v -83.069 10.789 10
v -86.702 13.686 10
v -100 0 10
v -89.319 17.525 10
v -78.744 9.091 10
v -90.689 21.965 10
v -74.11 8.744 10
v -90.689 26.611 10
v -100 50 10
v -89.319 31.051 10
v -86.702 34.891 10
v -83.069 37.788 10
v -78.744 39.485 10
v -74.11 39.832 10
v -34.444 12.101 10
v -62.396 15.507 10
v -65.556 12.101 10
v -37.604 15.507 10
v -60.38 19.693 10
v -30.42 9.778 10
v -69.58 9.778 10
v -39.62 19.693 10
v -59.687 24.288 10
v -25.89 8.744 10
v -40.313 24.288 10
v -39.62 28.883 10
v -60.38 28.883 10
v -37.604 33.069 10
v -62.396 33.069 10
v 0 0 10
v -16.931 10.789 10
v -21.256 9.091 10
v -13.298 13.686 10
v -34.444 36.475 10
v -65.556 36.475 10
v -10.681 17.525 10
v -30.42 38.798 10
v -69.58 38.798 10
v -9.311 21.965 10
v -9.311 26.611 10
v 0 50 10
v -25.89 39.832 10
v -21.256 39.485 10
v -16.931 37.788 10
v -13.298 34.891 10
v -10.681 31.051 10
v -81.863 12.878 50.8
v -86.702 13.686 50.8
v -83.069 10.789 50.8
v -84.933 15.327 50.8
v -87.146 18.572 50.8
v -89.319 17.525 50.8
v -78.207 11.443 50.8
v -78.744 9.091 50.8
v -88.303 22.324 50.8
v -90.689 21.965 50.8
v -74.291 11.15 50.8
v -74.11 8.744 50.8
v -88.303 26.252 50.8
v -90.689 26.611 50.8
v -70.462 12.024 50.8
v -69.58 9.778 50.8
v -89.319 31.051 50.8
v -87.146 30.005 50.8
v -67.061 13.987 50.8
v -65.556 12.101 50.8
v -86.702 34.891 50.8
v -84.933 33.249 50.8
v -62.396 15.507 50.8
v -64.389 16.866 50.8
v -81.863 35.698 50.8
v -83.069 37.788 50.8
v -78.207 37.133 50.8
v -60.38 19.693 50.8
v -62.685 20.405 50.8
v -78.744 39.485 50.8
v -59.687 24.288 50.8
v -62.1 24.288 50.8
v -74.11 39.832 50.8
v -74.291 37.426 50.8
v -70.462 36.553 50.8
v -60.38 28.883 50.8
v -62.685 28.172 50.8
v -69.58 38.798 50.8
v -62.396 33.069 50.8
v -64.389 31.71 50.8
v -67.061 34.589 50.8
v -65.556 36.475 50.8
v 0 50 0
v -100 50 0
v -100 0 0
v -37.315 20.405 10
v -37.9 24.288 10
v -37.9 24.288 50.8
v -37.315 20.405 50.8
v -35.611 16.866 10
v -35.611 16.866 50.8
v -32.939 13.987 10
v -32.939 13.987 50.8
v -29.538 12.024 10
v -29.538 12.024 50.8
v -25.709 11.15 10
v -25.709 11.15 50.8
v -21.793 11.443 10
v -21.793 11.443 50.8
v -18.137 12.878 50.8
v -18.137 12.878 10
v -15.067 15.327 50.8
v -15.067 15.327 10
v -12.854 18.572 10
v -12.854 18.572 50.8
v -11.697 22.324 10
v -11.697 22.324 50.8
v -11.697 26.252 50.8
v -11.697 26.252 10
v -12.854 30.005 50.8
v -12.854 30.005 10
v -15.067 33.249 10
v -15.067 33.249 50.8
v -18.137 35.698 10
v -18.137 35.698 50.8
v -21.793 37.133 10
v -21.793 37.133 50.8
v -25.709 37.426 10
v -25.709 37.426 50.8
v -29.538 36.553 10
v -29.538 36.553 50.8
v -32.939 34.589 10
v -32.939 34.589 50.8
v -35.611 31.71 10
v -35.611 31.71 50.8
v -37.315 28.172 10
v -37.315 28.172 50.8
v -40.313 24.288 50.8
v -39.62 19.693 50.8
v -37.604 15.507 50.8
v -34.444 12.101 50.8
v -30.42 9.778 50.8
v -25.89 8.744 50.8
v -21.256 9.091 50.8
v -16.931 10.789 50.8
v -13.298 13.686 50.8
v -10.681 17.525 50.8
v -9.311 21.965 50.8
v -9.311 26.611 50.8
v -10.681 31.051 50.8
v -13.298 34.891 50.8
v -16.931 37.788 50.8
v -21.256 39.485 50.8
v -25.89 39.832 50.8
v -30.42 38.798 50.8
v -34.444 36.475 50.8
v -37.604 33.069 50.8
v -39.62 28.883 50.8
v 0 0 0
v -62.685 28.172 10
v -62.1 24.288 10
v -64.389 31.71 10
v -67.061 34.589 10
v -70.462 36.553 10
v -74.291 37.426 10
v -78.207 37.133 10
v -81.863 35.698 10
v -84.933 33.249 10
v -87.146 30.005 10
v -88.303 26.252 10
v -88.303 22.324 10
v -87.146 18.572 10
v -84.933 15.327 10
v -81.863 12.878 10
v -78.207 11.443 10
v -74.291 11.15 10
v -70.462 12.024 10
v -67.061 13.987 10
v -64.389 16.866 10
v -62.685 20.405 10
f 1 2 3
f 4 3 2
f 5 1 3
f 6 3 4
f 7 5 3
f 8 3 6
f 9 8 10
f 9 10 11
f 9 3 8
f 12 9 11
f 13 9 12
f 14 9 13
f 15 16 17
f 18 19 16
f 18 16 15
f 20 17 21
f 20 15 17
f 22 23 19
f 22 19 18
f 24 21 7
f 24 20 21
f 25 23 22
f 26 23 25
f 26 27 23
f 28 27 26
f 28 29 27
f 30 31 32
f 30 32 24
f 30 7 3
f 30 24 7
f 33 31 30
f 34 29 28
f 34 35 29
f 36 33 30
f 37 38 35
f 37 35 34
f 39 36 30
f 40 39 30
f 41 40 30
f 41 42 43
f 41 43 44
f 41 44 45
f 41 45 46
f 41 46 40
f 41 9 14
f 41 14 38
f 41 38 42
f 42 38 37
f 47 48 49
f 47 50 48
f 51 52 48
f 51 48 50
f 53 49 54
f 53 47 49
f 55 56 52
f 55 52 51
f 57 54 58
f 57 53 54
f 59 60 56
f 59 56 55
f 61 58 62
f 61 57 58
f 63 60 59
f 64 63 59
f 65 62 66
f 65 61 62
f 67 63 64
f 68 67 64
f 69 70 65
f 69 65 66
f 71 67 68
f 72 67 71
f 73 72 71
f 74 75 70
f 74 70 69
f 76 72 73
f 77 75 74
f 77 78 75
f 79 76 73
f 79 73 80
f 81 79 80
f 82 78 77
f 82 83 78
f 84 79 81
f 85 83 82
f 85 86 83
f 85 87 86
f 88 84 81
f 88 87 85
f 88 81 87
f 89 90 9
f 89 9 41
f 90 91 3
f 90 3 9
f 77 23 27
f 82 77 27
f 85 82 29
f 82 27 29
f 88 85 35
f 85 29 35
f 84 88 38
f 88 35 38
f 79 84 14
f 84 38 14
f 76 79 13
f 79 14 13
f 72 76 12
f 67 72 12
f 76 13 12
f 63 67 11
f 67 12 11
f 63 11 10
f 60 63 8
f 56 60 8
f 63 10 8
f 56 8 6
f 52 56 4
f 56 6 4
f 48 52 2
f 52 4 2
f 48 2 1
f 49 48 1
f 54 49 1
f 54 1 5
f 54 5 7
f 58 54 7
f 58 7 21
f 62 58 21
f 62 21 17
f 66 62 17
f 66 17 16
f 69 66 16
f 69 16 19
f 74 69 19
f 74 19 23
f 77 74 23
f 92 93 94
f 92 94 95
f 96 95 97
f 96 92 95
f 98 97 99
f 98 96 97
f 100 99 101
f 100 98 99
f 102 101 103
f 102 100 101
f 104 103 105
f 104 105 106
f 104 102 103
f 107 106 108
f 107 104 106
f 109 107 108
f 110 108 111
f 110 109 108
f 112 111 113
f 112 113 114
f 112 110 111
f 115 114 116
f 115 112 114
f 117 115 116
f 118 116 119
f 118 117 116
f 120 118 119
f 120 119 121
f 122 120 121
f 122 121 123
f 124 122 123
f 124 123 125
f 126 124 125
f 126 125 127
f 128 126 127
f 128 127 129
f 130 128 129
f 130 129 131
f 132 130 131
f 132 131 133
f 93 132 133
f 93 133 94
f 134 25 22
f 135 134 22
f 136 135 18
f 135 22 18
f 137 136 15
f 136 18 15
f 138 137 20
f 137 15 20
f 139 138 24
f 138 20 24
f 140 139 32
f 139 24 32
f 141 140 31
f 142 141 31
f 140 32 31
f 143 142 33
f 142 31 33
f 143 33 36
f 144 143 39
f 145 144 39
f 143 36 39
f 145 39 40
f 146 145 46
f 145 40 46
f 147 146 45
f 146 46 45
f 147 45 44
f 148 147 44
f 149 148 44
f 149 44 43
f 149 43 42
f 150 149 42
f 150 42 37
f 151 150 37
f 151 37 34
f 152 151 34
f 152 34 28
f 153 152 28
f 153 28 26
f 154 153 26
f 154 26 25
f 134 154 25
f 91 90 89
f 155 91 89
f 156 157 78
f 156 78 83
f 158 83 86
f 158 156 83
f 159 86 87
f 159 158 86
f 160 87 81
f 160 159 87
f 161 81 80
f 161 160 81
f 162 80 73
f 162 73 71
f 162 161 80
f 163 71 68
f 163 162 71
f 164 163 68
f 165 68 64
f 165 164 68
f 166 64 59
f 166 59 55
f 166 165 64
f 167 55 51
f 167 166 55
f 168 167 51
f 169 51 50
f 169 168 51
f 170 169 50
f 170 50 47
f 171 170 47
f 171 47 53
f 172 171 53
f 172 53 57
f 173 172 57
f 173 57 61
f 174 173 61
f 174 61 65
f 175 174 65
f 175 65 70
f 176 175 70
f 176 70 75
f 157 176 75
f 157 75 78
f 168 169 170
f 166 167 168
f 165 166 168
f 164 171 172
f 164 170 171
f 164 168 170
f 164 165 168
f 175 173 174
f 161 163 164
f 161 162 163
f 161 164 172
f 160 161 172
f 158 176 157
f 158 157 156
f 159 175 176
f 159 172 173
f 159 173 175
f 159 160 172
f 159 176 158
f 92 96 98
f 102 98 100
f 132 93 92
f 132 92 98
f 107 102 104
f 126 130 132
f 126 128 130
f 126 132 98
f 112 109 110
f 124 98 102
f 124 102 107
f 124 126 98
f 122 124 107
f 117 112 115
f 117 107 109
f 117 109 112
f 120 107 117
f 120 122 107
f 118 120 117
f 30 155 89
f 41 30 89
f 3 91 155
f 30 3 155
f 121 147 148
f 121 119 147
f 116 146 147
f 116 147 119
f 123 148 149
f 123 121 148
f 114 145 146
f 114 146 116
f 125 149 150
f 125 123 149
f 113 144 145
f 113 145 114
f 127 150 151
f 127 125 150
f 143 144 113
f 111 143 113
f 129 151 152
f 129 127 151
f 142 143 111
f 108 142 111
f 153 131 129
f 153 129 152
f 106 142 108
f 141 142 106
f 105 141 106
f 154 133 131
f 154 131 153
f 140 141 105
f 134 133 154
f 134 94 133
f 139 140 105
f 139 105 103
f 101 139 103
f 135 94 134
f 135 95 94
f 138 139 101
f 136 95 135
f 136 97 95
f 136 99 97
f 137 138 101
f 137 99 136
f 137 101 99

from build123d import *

# Parameters (mm, degrees)
SKETCH1_W           = 100
SKETCH1_H           = 50
BOSS_EXTRUDE1_DEPTH = 10
SKETCH2_R           = 15.587917706
SKETCH2_R_2         = 13.17523912
BOSS_EXTRUDE2_DEPTH = 50.8


with BuildPart() as part:
    # Sketch1 → Boss-Extrude1 (new body)
    with BuildSketch(Plane.XY):
        with Locations((-50, 25)):
            Rectangle(SKETCH1_W, SKETCH1_H)
    extrude(amount=BOSS_EXTRUDE1_DEPTH)

    # Sketch2 → Boss-Extrude2 (add)
    # profile 1 of 2: a face of its own
    with BuildSketch(Plane.XY):
        with Locations((-75.275238724, 24.288037008)):
            Circle(SKETCH2_R)
        with Locations((-75.275238724, 24.288037008)):
            Circle(SKETCH2_R_2, mode=Mode.SUBTRACT)
    # profile 2 of 2: a face of its own
    with BuildSketch(Plane.XY):
        with Locations(Location((-24.724761276, 24.288037008, 0), (0, 0, 180))):
            Circle(SKETCH2_R)
        with Locations(Location((-24.724761276, 24.288037008, 0), (0, 0, 180))):
            Circle(SKETCH2_R_2, mode=Mode.SUBTRACT)
    extrude(amount=BOSS_EXTRUDE2_DEPTH)


solid = part.part
